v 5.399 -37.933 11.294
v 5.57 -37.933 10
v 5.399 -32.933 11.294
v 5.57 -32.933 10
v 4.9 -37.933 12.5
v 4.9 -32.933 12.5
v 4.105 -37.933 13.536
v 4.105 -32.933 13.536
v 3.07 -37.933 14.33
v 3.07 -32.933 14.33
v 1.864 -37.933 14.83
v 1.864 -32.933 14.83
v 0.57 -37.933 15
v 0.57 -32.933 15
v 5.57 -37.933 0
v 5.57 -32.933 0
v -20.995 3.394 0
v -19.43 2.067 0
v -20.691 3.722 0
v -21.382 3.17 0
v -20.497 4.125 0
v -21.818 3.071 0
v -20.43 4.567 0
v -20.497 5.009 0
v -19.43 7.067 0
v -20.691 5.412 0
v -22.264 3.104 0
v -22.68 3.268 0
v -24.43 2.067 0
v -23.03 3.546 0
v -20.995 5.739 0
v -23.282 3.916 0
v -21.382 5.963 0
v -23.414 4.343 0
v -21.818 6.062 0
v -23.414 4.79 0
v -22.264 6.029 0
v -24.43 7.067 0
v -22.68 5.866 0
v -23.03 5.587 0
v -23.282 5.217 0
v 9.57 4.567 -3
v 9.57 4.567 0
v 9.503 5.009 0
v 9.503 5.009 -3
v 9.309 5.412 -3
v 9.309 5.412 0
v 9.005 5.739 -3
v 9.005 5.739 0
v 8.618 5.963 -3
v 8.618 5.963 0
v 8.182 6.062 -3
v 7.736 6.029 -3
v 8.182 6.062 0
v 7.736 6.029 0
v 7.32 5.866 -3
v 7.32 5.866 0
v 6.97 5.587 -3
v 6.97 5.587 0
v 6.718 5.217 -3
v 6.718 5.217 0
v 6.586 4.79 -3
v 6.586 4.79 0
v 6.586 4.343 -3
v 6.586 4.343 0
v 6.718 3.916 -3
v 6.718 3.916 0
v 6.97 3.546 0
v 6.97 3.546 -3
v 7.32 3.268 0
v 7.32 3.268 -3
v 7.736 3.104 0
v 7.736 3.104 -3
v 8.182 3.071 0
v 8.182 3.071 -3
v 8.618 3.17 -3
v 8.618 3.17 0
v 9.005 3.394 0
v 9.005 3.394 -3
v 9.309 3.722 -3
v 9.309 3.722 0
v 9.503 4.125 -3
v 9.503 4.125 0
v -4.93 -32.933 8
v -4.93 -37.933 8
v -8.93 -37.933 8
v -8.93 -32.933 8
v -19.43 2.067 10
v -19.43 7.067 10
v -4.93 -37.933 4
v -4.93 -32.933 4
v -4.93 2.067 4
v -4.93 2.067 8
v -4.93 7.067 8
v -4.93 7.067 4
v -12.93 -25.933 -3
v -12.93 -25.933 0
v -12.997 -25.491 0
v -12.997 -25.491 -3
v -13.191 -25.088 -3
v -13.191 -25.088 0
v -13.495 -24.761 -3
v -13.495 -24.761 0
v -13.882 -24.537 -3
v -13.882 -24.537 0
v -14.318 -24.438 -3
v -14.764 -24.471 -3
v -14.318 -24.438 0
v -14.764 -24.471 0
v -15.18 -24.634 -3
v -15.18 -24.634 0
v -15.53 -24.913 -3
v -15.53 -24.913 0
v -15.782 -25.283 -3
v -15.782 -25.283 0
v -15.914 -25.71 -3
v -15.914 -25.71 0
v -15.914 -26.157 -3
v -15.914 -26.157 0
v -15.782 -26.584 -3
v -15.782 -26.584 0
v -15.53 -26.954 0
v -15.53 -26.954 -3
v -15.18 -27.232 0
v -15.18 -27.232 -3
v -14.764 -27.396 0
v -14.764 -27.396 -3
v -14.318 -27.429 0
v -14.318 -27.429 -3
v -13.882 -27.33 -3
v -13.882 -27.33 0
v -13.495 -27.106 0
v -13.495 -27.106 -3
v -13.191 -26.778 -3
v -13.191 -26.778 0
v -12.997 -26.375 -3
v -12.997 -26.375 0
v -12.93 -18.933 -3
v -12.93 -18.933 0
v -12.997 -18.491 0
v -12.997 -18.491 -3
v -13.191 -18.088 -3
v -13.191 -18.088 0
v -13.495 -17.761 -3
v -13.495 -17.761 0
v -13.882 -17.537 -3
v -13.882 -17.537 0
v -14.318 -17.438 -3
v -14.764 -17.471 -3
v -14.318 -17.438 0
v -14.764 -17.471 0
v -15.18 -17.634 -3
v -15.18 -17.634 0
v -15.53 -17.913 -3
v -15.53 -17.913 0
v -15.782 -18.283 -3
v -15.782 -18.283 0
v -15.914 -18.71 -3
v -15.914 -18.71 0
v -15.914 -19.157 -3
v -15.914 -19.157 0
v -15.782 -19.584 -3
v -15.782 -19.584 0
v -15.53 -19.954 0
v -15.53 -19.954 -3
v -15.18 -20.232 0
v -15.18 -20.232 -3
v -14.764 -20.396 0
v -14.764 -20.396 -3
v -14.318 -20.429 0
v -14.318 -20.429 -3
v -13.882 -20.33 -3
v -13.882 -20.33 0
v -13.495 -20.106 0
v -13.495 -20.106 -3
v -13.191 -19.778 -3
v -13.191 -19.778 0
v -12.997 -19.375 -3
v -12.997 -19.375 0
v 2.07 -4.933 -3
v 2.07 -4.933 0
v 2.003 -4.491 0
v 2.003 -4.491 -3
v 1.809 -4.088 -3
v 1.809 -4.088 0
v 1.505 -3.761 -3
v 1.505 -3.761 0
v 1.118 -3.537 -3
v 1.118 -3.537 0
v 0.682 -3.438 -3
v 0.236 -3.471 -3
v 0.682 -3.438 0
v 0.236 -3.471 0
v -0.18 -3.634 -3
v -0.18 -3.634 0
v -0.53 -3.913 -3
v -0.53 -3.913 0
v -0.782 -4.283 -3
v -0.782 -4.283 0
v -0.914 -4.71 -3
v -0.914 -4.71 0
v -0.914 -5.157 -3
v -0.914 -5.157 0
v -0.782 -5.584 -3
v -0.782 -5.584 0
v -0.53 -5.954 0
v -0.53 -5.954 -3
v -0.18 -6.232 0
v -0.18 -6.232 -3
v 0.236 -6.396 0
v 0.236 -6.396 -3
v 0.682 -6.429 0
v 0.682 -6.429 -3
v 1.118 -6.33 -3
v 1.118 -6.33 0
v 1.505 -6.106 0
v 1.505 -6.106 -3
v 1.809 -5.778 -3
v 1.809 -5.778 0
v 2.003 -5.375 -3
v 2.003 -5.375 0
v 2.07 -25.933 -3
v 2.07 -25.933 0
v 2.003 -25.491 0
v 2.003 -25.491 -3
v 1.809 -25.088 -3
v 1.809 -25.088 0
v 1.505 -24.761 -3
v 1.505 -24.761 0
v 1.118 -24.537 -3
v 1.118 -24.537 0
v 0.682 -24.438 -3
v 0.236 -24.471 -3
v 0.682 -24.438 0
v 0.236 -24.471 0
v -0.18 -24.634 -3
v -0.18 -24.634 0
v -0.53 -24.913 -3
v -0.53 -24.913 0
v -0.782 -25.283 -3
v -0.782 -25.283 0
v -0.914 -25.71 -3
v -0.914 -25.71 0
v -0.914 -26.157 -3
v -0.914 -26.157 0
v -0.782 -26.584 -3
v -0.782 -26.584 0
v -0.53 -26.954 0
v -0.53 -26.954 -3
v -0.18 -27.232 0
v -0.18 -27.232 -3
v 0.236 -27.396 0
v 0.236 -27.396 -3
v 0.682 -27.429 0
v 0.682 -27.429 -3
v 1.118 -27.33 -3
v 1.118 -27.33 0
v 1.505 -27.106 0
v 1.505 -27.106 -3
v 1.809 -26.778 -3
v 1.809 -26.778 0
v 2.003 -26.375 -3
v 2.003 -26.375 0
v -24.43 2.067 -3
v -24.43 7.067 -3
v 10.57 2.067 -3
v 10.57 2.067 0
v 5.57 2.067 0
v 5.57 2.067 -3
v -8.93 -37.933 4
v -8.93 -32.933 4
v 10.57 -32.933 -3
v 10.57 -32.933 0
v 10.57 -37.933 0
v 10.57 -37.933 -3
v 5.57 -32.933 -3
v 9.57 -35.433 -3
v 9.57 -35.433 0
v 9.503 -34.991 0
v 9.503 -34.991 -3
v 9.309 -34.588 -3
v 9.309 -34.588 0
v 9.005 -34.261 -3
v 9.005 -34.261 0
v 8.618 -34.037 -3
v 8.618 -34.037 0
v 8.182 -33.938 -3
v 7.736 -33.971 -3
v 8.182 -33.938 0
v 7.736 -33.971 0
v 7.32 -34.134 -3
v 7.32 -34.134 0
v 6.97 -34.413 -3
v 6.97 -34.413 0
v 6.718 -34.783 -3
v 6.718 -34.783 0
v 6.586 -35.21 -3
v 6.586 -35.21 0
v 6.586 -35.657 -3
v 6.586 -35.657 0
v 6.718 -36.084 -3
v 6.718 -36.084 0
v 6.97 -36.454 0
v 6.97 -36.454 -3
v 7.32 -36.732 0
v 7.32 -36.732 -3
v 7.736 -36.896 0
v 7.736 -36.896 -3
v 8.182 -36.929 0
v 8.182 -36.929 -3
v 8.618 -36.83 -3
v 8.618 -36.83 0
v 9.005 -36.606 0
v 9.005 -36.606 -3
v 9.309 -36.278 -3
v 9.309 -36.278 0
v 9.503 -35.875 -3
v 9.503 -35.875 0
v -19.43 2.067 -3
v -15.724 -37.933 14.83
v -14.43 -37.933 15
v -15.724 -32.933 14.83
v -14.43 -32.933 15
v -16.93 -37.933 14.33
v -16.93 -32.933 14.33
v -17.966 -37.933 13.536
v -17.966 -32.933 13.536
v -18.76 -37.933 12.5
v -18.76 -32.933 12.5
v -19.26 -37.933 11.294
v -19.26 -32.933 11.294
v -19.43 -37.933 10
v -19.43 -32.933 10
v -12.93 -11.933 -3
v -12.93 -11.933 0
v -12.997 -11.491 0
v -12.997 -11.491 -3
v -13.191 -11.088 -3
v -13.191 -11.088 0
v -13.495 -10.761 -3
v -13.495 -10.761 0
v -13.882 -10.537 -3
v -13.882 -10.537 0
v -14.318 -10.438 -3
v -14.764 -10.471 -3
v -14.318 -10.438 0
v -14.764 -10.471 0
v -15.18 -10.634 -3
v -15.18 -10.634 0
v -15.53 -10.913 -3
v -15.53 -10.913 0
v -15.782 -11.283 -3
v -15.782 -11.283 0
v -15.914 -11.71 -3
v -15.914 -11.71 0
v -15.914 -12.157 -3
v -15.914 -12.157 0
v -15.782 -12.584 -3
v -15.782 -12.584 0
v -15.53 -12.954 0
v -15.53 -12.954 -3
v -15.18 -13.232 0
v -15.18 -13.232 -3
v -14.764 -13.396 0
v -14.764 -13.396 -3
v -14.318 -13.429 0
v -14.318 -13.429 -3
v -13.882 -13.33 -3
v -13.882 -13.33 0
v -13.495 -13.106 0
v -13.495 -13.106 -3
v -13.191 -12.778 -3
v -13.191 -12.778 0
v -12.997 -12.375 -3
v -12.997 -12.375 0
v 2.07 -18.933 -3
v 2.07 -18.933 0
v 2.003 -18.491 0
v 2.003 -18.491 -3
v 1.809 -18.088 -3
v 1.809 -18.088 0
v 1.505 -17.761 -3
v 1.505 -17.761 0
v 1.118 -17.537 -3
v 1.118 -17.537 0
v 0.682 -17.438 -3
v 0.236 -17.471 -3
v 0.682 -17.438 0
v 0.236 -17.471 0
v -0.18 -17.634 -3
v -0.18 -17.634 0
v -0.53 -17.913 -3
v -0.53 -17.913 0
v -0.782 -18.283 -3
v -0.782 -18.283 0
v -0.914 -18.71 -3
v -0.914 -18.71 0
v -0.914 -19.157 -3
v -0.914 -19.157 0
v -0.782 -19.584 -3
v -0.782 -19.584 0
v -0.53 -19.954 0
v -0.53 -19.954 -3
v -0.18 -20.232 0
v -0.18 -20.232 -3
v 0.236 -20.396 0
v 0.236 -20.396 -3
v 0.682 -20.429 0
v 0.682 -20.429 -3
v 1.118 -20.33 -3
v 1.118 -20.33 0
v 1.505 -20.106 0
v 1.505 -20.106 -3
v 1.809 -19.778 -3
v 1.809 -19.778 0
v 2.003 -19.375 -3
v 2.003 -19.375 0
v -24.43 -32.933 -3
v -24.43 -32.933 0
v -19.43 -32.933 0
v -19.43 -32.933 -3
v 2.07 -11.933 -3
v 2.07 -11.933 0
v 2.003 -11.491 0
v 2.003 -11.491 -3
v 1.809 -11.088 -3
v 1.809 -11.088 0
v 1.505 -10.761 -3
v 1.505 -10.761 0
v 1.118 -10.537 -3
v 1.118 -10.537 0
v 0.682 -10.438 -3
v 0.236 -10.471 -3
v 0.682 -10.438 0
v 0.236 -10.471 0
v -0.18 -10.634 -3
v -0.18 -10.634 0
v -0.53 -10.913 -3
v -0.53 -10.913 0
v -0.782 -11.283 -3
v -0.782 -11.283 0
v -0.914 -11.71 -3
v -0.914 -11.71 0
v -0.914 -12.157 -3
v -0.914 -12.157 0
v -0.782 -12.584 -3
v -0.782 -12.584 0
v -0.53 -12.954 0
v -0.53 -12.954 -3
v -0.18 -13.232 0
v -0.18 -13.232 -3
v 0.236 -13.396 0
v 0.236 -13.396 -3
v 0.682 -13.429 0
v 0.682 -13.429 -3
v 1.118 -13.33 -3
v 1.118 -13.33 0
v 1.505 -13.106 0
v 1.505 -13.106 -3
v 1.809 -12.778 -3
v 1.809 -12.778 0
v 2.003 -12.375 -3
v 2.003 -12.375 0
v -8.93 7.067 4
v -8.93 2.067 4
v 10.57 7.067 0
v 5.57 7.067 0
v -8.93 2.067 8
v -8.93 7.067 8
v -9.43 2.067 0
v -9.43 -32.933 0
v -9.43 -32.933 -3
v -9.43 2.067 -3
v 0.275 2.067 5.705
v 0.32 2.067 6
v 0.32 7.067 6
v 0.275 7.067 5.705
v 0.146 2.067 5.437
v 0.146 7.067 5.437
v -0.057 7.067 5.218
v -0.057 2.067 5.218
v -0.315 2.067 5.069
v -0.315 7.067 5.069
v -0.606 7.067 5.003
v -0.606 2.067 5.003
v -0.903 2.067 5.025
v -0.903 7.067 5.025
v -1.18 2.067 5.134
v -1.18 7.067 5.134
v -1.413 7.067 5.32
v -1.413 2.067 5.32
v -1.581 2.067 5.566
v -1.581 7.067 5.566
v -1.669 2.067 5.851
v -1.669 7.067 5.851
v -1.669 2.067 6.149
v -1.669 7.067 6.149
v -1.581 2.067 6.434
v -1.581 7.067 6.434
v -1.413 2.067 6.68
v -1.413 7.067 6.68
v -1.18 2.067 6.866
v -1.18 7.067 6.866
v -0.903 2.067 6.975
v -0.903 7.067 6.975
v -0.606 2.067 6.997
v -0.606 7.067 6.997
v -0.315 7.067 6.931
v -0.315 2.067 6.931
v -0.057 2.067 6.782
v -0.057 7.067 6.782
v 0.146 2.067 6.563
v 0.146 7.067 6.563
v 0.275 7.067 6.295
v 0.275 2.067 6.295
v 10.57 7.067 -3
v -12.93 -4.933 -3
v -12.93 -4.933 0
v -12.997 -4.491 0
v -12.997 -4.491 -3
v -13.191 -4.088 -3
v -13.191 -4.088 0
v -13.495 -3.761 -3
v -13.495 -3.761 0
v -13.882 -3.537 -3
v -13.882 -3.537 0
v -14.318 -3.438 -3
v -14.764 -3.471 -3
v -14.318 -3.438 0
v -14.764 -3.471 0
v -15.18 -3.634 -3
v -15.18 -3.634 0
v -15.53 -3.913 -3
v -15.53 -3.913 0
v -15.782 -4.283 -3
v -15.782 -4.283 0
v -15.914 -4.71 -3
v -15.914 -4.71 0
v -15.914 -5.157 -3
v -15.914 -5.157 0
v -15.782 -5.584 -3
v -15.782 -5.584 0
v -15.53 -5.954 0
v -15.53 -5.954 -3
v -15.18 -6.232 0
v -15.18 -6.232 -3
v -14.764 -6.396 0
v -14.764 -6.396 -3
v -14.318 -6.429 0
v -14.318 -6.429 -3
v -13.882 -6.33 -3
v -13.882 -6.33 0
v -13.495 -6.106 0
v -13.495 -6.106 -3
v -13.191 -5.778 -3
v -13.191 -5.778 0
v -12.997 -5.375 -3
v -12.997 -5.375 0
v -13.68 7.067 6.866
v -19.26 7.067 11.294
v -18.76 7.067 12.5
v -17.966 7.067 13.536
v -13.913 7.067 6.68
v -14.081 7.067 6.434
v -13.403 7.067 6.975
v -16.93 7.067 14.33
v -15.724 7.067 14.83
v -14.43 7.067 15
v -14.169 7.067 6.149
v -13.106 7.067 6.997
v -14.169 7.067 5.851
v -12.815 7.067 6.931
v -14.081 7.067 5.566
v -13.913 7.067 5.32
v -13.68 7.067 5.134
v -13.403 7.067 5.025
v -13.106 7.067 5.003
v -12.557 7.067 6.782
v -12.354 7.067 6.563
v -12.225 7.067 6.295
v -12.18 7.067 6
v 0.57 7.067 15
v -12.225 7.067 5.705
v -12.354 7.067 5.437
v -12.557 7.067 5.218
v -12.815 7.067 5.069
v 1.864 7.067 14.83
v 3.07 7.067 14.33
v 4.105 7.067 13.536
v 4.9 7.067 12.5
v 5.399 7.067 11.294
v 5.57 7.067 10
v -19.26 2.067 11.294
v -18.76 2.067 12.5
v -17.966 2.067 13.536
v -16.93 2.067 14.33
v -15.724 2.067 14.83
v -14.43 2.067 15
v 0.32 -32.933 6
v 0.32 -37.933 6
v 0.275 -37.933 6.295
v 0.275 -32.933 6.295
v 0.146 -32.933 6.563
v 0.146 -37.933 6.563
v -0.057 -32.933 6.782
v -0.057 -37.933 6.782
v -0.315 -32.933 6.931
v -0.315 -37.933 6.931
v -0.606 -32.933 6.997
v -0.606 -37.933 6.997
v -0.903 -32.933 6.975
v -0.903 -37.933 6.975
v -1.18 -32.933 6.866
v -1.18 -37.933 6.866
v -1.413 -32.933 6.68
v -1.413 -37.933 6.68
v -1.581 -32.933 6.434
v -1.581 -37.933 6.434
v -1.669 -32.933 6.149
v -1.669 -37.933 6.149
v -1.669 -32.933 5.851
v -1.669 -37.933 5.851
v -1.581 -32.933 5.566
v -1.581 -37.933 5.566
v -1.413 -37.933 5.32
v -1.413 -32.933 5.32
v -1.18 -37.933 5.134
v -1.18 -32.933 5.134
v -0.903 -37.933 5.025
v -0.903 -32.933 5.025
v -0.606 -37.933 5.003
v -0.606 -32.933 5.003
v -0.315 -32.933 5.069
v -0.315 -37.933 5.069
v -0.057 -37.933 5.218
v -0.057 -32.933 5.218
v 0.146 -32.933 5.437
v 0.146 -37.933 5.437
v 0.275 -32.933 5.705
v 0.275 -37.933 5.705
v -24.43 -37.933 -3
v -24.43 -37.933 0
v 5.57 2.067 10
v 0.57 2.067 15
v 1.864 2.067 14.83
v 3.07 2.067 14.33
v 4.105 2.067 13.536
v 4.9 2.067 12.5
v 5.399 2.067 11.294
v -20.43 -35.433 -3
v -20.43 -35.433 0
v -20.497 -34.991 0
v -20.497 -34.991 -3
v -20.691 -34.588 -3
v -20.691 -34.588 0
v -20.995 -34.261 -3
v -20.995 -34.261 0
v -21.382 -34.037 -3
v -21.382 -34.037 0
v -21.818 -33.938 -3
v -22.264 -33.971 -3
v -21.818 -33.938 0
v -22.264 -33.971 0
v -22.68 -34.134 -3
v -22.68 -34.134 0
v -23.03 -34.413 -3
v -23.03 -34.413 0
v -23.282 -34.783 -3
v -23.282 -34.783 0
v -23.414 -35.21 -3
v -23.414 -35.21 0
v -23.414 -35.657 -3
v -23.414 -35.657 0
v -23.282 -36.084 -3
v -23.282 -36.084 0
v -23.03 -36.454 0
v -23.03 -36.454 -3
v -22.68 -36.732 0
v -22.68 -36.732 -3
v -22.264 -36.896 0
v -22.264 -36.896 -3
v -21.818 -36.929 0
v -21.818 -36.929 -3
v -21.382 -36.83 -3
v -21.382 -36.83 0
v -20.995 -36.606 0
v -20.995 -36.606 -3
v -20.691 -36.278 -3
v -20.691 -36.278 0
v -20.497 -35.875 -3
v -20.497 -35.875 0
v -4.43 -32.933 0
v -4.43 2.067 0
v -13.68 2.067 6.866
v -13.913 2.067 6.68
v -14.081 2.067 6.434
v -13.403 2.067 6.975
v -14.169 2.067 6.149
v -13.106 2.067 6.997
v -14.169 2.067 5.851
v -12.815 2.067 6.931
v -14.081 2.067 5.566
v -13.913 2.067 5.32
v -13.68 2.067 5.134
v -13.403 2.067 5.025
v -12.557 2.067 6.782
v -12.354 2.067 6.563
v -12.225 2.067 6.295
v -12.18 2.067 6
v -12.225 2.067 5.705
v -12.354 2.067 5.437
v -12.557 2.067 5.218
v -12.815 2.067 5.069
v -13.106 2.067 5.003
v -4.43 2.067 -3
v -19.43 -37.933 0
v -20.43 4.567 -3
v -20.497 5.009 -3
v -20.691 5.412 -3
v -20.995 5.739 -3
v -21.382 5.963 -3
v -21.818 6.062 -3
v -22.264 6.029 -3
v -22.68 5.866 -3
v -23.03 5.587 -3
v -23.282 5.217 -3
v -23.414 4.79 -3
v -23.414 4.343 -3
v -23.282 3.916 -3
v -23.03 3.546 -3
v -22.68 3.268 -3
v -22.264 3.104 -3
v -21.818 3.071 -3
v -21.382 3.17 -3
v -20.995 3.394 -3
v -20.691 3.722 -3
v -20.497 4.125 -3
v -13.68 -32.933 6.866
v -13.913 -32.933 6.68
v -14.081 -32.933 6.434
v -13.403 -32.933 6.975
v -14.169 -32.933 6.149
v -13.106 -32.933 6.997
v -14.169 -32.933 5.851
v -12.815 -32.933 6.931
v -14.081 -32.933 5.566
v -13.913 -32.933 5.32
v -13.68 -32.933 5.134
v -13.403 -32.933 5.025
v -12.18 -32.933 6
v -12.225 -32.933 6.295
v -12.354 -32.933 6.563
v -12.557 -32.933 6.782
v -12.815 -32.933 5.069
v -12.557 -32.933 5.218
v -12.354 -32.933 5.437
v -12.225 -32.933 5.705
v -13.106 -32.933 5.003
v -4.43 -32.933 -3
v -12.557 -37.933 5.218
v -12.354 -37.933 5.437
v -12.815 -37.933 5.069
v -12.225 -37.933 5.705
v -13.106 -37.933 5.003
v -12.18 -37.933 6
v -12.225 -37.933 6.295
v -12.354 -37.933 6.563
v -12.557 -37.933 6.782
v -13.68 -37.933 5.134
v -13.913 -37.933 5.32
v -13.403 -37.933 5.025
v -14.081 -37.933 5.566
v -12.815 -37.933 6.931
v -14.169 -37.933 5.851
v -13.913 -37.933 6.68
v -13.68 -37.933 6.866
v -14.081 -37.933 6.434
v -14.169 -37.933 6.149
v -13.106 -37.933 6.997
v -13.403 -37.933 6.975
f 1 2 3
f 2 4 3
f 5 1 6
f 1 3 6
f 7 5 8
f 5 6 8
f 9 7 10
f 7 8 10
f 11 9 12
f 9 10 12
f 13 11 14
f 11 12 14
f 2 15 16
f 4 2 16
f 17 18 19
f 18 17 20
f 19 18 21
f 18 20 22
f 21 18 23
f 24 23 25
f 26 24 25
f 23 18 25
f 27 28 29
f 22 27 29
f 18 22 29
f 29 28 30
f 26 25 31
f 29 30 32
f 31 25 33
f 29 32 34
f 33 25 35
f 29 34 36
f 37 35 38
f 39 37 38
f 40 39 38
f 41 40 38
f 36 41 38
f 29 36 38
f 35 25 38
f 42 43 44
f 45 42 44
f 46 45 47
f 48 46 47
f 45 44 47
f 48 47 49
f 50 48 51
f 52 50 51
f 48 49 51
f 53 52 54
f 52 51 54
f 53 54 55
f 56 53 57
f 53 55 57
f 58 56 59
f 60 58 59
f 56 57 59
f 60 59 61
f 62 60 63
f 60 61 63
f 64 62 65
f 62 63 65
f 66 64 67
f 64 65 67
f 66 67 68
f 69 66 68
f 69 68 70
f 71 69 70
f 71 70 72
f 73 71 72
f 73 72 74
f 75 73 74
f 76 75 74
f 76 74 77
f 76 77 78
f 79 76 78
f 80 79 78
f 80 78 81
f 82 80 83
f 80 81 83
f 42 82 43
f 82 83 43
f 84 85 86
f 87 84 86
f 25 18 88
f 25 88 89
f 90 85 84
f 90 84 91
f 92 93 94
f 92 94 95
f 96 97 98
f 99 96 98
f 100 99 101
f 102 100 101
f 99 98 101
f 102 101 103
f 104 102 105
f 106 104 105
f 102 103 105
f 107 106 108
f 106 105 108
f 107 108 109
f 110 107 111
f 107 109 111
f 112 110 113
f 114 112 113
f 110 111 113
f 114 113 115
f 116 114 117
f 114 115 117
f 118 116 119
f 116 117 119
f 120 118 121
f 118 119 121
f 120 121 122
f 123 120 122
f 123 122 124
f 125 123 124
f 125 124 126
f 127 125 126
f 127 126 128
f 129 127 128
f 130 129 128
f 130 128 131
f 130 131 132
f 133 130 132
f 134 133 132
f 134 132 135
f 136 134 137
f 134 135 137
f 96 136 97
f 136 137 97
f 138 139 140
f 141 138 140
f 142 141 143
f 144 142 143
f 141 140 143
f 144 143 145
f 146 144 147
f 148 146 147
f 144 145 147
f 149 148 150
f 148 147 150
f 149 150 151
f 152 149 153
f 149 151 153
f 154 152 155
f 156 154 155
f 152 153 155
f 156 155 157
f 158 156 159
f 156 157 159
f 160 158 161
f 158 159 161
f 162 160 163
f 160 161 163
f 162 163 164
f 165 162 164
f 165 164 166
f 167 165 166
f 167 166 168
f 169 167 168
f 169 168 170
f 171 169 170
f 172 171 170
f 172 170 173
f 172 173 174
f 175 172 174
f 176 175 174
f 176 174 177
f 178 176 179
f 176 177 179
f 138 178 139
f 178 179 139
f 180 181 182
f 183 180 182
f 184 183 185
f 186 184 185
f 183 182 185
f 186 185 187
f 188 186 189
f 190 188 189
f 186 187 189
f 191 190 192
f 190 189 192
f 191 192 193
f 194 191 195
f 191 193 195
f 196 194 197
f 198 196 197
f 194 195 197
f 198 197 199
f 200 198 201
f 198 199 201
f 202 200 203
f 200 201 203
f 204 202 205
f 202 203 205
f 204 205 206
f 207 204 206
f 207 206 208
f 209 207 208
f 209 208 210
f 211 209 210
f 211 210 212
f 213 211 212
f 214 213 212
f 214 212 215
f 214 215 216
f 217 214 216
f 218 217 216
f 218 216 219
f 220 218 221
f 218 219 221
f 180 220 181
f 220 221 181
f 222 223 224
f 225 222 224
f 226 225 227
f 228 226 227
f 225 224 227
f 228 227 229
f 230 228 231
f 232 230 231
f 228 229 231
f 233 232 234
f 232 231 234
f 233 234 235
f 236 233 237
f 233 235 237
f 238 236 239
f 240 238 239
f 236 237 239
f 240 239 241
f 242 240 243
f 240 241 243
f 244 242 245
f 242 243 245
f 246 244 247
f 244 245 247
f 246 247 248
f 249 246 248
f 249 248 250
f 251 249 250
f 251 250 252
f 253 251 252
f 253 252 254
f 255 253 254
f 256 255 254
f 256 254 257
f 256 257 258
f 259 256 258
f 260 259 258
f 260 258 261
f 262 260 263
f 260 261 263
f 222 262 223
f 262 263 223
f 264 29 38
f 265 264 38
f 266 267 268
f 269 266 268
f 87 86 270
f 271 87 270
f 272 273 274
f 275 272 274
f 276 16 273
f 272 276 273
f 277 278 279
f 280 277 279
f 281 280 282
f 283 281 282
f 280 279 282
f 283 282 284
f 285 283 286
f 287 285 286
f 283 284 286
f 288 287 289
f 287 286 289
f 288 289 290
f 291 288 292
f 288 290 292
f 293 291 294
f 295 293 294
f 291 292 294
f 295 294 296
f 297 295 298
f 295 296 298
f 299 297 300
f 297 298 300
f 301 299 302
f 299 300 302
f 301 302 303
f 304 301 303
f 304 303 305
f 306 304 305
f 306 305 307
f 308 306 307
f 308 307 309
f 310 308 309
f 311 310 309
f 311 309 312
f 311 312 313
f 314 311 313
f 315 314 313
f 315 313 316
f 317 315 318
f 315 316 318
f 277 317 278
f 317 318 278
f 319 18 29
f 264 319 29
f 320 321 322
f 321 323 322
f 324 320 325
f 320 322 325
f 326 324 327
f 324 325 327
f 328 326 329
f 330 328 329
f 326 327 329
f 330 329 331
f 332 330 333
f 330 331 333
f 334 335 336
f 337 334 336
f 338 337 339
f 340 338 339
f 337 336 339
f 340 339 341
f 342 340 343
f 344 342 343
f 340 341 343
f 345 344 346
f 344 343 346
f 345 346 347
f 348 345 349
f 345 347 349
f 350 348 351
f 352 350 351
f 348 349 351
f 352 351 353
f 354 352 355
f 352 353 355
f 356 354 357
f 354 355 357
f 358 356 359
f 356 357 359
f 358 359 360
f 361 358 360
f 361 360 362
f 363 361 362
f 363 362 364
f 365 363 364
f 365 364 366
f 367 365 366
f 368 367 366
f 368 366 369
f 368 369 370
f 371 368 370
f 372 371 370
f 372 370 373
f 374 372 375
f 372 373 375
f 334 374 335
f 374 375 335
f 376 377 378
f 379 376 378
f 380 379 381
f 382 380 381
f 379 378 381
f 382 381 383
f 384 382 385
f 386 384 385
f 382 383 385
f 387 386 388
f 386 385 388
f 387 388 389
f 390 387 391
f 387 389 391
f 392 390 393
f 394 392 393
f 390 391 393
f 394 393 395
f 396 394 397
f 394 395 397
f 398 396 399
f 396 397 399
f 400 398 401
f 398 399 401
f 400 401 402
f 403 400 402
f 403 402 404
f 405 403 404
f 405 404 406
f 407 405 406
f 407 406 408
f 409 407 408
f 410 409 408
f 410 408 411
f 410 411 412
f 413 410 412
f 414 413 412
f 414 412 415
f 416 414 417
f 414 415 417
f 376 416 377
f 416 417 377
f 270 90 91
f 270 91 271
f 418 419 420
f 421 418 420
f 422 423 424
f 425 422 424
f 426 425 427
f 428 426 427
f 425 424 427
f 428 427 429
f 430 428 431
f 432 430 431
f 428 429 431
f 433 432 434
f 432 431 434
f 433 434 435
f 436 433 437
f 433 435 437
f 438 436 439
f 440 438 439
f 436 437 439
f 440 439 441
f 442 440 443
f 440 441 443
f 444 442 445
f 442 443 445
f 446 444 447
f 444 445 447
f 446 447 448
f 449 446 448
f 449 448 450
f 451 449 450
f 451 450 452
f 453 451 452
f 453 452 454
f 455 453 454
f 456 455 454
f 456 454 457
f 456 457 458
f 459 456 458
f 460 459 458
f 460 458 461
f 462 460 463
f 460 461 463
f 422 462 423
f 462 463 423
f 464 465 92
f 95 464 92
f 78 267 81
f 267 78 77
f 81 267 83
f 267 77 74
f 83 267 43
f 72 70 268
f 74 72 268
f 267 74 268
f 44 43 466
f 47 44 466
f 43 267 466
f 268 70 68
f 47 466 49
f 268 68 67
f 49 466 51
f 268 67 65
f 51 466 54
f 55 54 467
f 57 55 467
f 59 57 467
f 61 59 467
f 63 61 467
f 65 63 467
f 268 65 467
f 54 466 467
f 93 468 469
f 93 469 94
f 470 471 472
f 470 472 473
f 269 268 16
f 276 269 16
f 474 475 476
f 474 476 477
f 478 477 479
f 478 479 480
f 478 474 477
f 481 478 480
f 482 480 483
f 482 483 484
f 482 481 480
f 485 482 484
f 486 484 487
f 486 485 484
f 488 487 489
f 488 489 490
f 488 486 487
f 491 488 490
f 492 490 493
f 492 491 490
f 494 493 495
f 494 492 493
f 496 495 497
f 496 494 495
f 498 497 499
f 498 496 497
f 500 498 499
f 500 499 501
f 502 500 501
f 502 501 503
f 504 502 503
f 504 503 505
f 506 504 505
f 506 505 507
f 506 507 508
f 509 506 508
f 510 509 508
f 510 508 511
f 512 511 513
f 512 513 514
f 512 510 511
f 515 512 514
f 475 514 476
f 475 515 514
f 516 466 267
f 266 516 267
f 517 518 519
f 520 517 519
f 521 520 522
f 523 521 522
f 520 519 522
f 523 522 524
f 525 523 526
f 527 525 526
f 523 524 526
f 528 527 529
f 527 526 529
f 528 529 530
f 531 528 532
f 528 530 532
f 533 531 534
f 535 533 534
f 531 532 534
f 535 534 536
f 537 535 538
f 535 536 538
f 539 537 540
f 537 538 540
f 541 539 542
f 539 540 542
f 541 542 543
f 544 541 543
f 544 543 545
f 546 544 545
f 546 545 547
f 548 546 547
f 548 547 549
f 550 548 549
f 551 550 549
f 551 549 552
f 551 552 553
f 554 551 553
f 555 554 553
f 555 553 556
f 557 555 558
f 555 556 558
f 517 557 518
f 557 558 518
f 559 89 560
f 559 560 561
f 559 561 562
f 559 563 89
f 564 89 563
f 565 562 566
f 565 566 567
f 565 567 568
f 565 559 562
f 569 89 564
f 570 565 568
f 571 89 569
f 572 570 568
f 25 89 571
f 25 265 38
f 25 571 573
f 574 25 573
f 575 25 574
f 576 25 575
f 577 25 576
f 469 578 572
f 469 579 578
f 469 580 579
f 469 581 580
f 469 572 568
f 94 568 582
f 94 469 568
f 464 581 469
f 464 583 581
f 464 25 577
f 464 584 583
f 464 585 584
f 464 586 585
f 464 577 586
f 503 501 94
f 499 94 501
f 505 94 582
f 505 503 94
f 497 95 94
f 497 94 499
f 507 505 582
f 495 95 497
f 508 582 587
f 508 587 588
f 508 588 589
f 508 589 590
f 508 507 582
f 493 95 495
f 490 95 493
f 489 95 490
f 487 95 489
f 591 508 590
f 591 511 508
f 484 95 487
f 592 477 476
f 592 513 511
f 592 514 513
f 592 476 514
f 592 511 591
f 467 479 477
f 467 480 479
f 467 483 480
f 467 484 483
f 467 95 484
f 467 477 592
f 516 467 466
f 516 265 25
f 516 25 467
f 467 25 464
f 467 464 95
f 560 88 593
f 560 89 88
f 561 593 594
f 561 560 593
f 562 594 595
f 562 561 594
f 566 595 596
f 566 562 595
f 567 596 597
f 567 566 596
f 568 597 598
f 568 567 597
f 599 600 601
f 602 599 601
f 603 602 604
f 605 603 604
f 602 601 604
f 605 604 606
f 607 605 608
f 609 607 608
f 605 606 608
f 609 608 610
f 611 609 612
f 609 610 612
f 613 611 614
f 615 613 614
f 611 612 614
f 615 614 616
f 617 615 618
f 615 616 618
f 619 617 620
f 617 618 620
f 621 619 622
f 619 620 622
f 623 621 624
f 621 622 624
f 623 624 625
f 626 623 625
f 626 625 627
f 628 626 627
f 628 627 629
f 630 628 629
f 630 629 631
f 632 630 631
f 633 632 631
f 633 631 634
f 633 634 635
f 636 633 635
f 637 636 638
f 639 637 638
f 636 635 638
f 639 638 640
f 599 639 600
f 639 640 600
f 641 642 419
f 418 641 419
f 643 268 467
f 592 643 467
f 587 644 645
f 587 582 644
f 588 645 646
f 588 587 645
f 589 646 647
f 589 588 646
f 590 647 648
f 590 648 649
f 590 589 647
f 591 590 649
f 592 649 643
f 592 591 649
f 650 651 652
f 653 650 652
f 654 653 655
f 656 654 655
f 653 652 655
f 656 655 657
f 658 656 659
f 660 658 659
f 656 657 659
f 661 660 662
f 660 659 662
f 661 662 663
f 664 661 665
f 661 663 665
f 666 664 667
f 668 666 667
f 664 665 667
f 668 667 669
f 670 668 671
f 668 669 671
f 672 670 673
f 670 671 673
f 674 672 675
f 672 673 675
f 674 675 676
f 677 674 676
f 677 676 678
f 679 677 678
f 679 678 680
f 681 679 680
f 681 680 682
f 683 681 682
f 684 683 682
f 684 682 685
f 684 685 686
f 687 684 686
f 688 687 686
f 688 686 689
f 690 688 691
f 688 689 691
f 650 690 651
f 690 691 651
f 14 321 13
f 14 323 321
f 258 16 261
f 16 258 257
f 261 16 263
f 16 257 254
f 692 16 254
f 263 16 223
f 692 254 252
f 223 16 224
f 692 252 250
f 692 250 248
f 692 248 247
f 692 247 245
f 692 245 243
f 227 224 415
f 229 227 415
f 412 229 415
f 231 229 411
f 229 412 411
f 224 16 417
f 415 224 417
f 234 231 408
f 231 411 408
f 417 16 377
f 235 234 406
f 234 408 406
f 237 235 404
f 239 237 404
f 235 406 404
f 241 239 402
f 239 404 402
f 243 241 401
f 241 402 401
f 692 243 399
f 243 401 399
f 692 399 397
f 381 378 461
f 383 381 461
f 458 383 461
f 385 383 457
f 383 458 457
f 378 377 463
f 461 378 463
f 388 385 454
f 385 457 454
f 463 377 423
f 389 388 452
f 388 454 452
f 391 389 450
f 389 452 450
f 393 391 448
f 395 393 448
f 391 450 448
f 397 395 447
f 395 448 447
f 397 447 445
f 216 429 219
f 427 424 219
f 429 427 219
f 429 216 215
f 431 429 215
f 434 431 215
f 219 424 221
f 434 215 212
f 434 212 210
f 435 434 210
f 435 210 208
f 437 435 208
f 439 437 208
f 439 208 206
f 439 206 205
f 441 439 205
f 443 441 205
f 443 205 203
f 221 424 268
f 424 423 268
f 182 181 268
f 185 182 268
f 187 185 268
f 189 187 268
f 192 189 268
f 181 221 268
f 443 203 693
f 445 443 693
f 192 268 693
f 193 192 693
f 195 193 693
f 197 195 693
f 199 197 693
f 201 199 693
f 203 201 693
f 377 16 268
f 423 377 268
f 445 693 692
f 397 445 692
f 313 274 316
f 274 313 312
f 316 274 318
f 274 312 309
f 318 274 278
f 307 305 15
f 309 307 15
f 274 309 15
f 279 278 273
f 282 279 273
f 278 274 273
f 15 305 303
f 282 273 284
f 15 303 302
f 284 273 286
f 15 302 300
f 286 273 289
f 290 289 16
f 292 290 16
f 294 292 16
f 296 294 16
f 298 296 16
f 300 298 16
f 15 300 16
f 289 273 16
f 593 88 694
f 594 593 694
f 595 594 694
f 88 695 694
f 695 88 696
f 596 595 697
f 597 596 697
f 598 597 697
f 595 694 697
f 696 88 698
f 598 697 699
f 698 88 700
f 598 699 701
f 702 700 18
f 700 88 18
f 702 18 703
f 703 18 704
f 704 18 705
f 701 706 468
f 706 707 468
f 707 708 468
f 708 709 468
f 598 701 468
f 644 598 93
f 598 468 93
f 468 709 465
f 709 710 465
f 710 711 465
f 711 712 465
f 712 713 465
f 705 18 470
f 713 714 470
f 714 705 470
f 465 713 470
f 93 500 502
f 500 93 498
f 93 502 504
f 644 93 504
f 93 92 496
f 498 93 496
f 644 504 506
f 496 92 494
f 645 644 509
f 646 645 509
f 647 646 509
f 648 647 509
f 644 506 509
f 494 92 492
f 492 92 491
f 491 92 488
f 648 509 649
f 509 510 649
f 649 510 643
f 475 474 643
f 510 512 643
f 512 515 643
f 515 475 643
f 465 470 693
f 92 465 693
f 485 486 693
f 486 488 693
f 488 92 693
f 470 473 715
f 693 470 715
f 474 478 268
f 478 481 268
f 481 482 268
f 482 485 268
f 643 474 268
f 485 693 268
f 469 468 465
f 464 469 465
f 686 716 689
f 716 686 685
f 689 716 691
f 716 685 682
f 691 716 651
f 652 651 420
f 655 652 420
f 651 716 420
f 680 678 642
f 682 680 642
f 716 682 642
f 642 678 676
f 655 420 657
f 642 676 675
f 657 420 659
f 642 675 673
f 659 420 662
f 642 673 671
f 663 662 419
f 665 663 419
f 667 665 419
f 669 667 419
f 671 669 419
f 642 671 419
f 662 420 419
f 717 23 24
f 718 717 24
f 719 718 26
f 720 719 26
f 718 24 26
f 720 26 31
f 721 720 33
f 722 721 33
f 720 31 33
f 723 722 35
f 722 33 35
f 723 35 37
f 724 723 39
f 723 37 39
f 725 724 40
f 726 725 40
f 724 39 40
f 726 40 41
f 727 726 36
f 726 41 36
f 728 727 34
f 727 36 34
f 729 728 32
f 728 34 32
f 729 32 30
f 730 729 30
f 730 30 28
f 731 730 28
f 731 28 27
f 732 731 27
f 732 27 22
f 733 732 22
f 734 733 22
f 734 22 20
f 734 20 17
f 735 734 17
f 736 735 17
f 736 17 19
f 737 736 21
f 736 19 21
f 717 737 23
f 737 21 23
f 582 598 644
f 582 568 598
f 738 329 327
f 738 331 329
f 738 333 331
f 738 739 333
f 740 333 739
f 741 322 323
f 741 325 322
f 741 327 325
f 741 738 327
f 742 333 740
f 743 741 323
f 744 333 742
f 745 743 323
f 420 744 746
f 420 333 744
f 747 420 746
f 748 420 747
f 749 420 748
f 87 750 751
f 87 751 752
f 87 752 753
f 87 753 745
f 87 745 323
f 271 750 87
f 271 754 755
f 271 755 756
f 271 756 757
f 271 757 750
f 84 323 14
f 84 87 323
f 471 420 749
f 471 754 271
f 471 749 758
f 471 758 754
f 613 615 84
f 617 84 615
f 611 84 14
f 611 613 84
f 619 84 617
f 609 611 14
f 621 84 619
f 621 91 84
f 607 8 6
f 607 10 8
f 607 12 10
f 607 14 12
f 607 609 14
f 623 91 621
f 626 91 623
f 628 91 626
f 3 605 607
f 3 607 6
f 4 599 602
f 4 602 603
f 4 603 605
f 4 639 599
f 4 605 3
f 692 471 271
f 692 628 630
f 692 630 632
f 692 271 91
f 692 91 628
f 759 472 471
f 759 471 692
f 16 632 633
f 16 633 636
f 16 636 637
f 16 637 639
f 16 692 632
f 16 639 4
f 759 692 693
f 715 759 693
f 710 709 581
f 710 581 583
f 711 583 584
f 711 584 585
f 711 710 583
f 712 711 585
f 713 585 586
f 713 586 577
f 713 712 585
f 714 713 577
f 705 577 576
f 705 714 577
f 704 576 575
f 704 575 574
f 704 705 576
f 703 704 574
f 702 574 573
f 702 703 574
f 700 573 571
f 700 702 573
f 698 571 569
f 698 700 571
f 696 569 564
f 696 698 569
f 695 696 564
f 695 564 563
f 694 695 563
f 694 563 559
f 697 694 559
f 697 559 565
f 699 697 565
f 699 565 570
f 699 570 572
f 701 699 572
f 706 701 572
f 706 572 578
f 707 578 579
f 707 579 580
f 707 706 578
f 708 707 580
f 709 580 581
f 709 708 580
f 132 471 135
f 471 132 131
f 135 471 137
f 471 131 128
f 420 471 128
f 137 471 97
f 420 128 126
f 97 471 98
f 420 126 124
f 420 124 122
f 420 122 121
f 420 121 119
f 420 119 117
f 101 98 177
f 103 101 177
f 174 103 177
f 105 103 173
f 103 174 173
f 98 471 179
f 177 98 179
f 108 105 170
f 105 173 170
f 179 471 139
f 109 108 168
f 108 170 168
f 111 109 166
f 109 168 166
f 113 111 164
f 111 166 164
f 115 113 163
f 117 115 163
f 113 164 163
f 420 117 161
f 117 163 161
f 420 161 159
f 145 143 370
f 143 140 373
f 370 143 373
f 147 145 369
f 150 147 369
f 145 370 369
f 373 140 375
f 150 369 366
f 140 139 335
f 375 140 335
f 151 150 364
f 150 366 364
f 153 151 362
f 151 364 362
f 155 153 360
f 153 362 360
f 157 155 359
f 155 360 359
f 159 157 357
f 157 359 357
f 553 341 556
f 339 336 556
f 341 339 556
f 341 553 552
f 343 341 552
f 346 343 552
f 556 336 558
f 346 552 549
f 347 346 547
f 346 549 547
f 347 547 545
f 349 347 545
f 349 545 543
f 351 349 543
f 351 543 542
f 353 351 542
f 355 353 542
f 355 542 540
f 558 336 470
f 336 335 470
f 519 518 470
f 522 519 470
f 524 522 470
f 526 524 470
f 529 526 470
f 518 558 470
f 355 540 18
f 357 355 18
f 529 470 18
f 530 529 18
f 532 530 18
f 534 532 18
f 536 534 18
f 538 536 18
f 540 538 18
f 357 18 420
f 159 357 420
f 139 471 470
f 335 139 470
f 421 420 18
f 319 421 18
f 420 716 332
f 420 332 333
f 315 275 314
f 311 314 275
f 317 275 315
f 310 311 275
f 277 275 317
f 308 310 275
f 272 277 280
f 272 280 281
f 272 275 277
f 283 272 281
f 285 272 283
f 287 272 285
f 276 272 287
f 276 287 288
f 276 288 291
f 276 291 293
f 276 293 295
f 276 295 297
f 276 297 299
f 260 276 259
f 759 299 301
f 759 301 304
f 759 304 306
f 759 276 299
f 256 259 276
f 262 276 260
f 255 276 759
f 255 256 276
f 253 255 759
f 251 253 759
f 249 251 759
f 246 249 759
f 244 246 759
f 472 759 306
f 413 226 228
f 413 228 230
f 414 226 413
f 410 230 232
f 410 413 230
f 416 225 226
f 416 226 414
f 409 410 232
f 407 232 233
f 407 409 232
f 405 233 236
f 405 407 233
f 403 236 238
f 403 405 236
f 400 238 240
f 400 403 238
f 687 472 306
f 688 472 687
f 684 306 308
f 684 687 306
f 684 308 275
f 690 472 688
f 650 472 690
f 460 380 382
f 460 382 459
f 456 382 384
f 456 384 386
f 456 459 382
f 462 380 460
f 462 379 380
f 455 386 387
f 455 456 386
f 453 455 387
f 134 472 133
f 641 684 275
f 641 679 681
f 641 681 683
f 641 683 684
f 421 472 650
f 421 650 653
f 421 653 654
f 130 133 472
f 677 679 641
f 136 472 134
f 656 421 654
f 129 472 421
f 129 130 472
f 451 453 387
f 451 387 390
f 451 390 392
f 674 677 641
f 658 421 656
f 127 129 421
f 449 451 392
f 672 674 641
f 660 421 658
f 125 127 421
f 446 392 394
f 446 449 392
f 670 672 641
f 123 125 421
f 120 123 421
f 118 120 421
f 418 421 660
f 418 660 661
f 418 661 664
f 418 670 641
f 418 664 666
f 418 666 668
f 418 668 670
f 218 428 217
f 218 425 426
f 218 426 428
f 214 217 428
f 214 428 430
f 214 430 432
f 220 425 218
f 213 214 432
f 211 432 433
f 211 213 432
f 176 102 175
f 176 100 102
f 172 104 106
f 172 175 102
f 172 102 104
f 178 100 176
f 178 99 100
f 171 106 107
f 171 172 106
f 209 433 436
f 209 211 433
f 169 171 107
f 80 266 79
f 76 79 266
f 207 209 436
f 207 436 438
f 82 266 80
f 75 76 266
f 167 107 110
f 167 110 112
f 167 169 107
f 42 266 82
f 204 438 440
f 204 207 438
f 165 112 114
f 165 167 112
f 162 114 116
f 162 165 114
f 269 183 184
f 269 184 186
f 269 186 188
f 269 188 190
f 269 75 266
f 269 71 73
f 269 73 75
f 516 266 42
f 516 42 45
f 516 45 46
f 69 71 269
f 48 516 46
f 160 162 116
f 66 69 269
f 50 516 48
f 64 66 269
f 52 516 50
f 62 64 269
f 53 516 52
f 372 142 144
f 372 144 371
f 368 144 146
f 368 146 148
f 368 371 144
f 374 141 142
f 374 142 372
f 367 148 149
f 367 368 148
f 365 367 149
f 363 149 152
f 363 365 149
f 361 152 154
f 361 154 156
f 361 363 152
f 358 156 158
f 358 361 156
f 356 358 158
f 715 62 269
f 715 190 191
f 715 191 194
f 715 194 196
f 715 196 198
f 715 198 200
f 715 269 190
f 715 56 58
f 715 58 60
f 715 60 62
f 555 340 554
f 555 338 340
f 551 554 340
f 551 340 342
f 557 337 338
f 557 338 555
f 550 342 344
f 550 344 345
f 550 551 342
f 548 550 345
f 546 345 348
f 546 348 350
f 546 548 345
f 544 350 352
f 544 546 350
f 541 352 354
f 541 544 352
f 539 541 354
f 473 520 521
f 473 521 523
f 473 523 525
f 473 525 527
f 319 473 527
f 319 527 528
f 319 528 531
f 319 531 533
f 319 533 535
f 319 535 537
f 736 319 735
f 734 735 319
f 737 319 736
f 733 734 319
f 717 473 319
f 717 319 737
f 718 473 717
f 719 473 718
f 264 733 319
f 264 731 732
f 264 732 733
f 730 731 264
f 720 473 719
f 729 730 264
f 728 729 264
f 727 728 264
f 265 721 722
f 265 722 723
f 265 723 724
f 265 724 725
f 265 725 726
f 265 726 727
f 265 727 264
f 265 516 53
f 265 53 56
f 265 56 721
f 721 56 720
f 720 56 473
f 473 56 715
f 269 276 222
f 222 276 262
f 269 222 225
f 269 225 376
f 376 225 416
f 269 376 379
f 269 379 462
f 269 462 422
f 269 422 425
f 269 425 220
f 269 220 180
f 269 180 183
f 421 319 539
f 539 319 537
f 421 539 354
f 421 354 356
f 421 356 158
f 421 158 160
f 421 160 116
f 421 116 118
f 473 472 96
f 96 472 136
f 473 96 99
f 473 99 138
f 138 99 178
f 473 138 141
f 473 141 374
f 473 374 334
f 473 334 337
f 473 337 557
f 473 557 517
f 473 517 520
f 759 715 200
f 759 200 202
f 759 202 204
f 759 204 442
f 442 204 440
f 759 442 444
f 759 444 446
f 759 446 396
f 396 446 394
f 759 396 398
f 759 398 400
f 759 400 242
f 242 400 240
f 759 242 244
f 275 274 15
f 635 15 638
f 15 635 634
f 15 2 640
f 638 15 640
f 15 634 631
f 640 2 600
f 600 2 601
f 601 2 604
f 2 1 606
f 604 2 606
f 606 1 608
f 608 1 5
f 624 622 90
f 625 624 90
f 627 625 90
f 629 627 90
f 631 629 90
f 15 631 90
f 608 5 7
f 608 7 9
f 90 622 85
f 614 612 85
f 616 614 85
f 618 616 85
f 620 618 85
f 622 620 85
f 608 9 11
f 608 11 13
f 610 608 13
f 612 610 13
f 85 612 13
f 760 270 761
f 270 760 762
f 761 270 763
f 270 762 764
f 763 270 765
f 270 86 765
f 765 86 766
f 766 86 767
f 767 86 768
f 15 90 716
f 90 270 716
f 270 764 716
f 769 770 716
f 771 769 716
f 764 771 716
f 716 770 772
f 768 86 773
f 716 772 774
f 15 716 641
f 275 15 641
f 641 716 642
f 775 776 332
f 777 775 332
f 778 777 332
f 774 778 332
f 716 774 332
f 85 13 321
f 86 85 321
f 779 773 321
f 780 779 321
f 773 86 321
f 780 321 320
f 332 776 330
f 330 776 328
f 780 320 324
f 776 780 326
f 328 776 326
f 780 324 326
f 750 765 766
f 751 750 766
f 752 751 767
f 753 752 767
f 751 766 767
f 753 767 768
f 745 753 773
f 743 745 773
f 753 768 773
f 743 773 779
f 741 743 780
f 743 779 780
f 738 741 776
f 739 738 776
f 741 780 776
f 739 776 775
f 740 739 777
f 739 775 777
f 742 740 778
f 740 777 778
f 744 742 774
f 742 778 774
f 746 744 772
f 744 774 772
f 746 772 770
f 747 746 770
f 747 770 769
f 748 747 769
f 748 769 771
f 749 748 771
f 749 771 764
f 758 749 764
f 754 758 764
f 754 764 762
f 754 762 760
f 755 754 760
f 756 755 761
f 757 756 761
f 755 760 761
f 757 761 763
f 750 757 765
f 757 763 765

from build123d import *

# Parameters (mm, degrees)
ESBO_O1_R                = 1.5
ESBO_O1_W                = 5
ESBO_O1_H                = 35
RESSALTO_EXTRUS_O1_DEPTH = 3
ESBO_O2_W                = 25
ESBO_O2_H                = 5
RESSALTO_EXTRUS_O2_DEPTH = 15
FILETE5_R                = 5
FILETE6_R                = 5
FILETE7_R                = 5
FILETE8_R                = 5
ESBO_O3_R                = 1
ESBO_O3_W                = 4
ESBO_O3_H                = 4
CORTE_EXTRUS_O1_DEPTH    = 5
CORTE_EXTRUS_O2_START    = -5
ESBO_O4_R                = 1
ESBO_O4_W                = 4
ESBO_O4_H                = 4
CORTE_EXTRUS_O2_DEPTH    = 5


with BuildPart() as part:
    # Esboço1 → Ressalto-extrusão1 (new body)
    with BuildSketch(Plane.XY):
        Polygon((-24.430369357, 7.066666667), (10.569630643, 7.066666667), (10.569630643, 2.066666667), (5.569630643, 2.066666667), (5.569630643, -32.933333333), (10.569630643, -32.933333333), (10.569630643, -37.933333333), (-24.430369357, -37.933333333), (-24.430369357, -32.933333333), (-19.430369357, -32.933333333), (-19.430369357, 2.066666667), (-24.430369357, 2.066666667), align=None)
        with Locations((-14.430369357, -4.933333333)):
            Circle(ESBO_O1_R, mode=Mode.SUBTRACT)
        with Locations((-14.430369357, -11.933333333)):
            Circle(ESBO_O1_R, mode=Mode.SUBTRACT)
        with Locations((-14.430369357, -18.933333333)):
            Circle(ESBO_O1_R, mode=Mode.SUBTRACT)
        with Locations((0.569630643, -4.933333333)):
            Circle(ESBO_O1_R, mode=Mode.SUBTRACT)
        with Locations((0.569630643, -18.933333333)):
            Circle(ESBO_O1_R, mode=Mode.SUBTRACT)
        with Locations((0.569630643, -25.933333333)):
            Circle(ESBO_O1_R, mode=Mode.SUBTRACT)
        with Locations((-14.430369357, -25.933333333)):
            Circle(ESBO_O1_R, mode=Mode.SUBTRACT)
        with Locations((0.569630643, -11.933333333)):
            Circle(ESBO_O1_R, mode=Mode.SUBTRACT)
        with Locations((-21.930369357, 4.566666667)):
            Circle(ESBO_O1_R, mode=Mode.SUBTRACT)
        with Locations((8.069630643, 4.566666667)):
            Circle(ESBO_O1_R, mode=Mode.SUBTRACT)
        with Locations((-21.930369357, -35.433333333)):
            Circle(ESBO_O1_R, mode=Mode.SUBTRACT)
        with Locations((8.069630643, -35.433333333)):
            Circle(ESBO_O1_R, mode=Mode.SUBTRACT)
        with Locations((-6.930369357, -15.433333333)):
            Rectangle(ESBO_O1_W, ESBO_O1_H, mode=Mode.SUBTRACT)
    extrude(amount=-RESSALTO_EXTRUS_O1_DEPTH)

    # Esboço2 → Ressalto-extrusão2 (add)
    with BuildSketch(Plane.XY):
        with Locations((-6.930369357, 4.566666667)):
            Rectangle(ESBO_O2_W, ESBO_O2_H)
        with Locations((-6.930369357, -35.433333333)):
            Rectangle(ESBO_O2_W, ESBO_O2_H)
    extrude(amount=RESSALTO_EXTRUS_O2_DEPTH)

    # Filete5
    filete5_edges = [part.edges().sort_by_distance(p)[0] for p in [
        (5.569630643, -35.433333333, 15),
    ]]
    fillet(filete5_edges, radius=FILETE5_R)

    # Filete6
    filete6_edges = [part.edges().sort_by_distance(p)[0] for p in [
        (-19.430369357, -35.433333333, 15),
    ]]
    fillet(filete6_edges, radius=FILETE6_R)

    # Filete7
    filete7_edges = [part.edges().sort_by_distance(p)[0] for p in [
        (-19.430369357, 4.566666667, 15),
    ]]
    fillet(filete7_edges, radius=FILETE7_R)

    # Filete8
    filete8_edges = [part.edges().sort_by_distance(p)[0] for p in [
        (5.569630643, 4.566666667, 15),
    ]]
    fillet(filete8_edges, radius=FILETE8_R)

    # Esboço3 → Corte-extrusão1 (cut)
    with BuildSketch(Plane(origin=(0, -37.933333333, 0), x_dir=(-1, 0, 0), z_dir=(0, -1, 0))):
        with Locations(Location((13.180369357, -6, 0), (0, 0, 180))):
            Circle(ESBO_O3_R)
        with Locations(Location((0.680369357, -6.000000354, 0), (0, 0, 180))):
            Circle(ESBO_O3_R)
        with Locations((6.930369357, -6)):
            Rectangle(ESBO_O3_W, ESBO_O3_H)
    extrude(amount=-CORTE_EXTRUS_O1_DEPTH, mode=Mode.SUBTRACT)

    # Esboço4 → Corte-extrusão2 (cut)
    with BuildSketch(Plane(origin=(0, 7.066666667, 0), x_dir=(1, 0, 0), z_dir=(0, 1, 0)).offset(CORTE_EXTRUS_O2_START)):
        with Locations((-13.180369357, -6)):
            Circle(ESBO_O4_R)
        with Locations(Location((-0.680369357, -6, 0), (0, 0, 359.999979706))):
            Circle(ESBO_O4_R)
        with Locations((-6.930369357, -6)):
            Rectangle(ESBO_O4_W, ESBO_O4_H)
    extrude(amount=CORTE_EXTRUS_O2_DEPTH, mode=Mode.SUBTRACT)


solid = part.part
